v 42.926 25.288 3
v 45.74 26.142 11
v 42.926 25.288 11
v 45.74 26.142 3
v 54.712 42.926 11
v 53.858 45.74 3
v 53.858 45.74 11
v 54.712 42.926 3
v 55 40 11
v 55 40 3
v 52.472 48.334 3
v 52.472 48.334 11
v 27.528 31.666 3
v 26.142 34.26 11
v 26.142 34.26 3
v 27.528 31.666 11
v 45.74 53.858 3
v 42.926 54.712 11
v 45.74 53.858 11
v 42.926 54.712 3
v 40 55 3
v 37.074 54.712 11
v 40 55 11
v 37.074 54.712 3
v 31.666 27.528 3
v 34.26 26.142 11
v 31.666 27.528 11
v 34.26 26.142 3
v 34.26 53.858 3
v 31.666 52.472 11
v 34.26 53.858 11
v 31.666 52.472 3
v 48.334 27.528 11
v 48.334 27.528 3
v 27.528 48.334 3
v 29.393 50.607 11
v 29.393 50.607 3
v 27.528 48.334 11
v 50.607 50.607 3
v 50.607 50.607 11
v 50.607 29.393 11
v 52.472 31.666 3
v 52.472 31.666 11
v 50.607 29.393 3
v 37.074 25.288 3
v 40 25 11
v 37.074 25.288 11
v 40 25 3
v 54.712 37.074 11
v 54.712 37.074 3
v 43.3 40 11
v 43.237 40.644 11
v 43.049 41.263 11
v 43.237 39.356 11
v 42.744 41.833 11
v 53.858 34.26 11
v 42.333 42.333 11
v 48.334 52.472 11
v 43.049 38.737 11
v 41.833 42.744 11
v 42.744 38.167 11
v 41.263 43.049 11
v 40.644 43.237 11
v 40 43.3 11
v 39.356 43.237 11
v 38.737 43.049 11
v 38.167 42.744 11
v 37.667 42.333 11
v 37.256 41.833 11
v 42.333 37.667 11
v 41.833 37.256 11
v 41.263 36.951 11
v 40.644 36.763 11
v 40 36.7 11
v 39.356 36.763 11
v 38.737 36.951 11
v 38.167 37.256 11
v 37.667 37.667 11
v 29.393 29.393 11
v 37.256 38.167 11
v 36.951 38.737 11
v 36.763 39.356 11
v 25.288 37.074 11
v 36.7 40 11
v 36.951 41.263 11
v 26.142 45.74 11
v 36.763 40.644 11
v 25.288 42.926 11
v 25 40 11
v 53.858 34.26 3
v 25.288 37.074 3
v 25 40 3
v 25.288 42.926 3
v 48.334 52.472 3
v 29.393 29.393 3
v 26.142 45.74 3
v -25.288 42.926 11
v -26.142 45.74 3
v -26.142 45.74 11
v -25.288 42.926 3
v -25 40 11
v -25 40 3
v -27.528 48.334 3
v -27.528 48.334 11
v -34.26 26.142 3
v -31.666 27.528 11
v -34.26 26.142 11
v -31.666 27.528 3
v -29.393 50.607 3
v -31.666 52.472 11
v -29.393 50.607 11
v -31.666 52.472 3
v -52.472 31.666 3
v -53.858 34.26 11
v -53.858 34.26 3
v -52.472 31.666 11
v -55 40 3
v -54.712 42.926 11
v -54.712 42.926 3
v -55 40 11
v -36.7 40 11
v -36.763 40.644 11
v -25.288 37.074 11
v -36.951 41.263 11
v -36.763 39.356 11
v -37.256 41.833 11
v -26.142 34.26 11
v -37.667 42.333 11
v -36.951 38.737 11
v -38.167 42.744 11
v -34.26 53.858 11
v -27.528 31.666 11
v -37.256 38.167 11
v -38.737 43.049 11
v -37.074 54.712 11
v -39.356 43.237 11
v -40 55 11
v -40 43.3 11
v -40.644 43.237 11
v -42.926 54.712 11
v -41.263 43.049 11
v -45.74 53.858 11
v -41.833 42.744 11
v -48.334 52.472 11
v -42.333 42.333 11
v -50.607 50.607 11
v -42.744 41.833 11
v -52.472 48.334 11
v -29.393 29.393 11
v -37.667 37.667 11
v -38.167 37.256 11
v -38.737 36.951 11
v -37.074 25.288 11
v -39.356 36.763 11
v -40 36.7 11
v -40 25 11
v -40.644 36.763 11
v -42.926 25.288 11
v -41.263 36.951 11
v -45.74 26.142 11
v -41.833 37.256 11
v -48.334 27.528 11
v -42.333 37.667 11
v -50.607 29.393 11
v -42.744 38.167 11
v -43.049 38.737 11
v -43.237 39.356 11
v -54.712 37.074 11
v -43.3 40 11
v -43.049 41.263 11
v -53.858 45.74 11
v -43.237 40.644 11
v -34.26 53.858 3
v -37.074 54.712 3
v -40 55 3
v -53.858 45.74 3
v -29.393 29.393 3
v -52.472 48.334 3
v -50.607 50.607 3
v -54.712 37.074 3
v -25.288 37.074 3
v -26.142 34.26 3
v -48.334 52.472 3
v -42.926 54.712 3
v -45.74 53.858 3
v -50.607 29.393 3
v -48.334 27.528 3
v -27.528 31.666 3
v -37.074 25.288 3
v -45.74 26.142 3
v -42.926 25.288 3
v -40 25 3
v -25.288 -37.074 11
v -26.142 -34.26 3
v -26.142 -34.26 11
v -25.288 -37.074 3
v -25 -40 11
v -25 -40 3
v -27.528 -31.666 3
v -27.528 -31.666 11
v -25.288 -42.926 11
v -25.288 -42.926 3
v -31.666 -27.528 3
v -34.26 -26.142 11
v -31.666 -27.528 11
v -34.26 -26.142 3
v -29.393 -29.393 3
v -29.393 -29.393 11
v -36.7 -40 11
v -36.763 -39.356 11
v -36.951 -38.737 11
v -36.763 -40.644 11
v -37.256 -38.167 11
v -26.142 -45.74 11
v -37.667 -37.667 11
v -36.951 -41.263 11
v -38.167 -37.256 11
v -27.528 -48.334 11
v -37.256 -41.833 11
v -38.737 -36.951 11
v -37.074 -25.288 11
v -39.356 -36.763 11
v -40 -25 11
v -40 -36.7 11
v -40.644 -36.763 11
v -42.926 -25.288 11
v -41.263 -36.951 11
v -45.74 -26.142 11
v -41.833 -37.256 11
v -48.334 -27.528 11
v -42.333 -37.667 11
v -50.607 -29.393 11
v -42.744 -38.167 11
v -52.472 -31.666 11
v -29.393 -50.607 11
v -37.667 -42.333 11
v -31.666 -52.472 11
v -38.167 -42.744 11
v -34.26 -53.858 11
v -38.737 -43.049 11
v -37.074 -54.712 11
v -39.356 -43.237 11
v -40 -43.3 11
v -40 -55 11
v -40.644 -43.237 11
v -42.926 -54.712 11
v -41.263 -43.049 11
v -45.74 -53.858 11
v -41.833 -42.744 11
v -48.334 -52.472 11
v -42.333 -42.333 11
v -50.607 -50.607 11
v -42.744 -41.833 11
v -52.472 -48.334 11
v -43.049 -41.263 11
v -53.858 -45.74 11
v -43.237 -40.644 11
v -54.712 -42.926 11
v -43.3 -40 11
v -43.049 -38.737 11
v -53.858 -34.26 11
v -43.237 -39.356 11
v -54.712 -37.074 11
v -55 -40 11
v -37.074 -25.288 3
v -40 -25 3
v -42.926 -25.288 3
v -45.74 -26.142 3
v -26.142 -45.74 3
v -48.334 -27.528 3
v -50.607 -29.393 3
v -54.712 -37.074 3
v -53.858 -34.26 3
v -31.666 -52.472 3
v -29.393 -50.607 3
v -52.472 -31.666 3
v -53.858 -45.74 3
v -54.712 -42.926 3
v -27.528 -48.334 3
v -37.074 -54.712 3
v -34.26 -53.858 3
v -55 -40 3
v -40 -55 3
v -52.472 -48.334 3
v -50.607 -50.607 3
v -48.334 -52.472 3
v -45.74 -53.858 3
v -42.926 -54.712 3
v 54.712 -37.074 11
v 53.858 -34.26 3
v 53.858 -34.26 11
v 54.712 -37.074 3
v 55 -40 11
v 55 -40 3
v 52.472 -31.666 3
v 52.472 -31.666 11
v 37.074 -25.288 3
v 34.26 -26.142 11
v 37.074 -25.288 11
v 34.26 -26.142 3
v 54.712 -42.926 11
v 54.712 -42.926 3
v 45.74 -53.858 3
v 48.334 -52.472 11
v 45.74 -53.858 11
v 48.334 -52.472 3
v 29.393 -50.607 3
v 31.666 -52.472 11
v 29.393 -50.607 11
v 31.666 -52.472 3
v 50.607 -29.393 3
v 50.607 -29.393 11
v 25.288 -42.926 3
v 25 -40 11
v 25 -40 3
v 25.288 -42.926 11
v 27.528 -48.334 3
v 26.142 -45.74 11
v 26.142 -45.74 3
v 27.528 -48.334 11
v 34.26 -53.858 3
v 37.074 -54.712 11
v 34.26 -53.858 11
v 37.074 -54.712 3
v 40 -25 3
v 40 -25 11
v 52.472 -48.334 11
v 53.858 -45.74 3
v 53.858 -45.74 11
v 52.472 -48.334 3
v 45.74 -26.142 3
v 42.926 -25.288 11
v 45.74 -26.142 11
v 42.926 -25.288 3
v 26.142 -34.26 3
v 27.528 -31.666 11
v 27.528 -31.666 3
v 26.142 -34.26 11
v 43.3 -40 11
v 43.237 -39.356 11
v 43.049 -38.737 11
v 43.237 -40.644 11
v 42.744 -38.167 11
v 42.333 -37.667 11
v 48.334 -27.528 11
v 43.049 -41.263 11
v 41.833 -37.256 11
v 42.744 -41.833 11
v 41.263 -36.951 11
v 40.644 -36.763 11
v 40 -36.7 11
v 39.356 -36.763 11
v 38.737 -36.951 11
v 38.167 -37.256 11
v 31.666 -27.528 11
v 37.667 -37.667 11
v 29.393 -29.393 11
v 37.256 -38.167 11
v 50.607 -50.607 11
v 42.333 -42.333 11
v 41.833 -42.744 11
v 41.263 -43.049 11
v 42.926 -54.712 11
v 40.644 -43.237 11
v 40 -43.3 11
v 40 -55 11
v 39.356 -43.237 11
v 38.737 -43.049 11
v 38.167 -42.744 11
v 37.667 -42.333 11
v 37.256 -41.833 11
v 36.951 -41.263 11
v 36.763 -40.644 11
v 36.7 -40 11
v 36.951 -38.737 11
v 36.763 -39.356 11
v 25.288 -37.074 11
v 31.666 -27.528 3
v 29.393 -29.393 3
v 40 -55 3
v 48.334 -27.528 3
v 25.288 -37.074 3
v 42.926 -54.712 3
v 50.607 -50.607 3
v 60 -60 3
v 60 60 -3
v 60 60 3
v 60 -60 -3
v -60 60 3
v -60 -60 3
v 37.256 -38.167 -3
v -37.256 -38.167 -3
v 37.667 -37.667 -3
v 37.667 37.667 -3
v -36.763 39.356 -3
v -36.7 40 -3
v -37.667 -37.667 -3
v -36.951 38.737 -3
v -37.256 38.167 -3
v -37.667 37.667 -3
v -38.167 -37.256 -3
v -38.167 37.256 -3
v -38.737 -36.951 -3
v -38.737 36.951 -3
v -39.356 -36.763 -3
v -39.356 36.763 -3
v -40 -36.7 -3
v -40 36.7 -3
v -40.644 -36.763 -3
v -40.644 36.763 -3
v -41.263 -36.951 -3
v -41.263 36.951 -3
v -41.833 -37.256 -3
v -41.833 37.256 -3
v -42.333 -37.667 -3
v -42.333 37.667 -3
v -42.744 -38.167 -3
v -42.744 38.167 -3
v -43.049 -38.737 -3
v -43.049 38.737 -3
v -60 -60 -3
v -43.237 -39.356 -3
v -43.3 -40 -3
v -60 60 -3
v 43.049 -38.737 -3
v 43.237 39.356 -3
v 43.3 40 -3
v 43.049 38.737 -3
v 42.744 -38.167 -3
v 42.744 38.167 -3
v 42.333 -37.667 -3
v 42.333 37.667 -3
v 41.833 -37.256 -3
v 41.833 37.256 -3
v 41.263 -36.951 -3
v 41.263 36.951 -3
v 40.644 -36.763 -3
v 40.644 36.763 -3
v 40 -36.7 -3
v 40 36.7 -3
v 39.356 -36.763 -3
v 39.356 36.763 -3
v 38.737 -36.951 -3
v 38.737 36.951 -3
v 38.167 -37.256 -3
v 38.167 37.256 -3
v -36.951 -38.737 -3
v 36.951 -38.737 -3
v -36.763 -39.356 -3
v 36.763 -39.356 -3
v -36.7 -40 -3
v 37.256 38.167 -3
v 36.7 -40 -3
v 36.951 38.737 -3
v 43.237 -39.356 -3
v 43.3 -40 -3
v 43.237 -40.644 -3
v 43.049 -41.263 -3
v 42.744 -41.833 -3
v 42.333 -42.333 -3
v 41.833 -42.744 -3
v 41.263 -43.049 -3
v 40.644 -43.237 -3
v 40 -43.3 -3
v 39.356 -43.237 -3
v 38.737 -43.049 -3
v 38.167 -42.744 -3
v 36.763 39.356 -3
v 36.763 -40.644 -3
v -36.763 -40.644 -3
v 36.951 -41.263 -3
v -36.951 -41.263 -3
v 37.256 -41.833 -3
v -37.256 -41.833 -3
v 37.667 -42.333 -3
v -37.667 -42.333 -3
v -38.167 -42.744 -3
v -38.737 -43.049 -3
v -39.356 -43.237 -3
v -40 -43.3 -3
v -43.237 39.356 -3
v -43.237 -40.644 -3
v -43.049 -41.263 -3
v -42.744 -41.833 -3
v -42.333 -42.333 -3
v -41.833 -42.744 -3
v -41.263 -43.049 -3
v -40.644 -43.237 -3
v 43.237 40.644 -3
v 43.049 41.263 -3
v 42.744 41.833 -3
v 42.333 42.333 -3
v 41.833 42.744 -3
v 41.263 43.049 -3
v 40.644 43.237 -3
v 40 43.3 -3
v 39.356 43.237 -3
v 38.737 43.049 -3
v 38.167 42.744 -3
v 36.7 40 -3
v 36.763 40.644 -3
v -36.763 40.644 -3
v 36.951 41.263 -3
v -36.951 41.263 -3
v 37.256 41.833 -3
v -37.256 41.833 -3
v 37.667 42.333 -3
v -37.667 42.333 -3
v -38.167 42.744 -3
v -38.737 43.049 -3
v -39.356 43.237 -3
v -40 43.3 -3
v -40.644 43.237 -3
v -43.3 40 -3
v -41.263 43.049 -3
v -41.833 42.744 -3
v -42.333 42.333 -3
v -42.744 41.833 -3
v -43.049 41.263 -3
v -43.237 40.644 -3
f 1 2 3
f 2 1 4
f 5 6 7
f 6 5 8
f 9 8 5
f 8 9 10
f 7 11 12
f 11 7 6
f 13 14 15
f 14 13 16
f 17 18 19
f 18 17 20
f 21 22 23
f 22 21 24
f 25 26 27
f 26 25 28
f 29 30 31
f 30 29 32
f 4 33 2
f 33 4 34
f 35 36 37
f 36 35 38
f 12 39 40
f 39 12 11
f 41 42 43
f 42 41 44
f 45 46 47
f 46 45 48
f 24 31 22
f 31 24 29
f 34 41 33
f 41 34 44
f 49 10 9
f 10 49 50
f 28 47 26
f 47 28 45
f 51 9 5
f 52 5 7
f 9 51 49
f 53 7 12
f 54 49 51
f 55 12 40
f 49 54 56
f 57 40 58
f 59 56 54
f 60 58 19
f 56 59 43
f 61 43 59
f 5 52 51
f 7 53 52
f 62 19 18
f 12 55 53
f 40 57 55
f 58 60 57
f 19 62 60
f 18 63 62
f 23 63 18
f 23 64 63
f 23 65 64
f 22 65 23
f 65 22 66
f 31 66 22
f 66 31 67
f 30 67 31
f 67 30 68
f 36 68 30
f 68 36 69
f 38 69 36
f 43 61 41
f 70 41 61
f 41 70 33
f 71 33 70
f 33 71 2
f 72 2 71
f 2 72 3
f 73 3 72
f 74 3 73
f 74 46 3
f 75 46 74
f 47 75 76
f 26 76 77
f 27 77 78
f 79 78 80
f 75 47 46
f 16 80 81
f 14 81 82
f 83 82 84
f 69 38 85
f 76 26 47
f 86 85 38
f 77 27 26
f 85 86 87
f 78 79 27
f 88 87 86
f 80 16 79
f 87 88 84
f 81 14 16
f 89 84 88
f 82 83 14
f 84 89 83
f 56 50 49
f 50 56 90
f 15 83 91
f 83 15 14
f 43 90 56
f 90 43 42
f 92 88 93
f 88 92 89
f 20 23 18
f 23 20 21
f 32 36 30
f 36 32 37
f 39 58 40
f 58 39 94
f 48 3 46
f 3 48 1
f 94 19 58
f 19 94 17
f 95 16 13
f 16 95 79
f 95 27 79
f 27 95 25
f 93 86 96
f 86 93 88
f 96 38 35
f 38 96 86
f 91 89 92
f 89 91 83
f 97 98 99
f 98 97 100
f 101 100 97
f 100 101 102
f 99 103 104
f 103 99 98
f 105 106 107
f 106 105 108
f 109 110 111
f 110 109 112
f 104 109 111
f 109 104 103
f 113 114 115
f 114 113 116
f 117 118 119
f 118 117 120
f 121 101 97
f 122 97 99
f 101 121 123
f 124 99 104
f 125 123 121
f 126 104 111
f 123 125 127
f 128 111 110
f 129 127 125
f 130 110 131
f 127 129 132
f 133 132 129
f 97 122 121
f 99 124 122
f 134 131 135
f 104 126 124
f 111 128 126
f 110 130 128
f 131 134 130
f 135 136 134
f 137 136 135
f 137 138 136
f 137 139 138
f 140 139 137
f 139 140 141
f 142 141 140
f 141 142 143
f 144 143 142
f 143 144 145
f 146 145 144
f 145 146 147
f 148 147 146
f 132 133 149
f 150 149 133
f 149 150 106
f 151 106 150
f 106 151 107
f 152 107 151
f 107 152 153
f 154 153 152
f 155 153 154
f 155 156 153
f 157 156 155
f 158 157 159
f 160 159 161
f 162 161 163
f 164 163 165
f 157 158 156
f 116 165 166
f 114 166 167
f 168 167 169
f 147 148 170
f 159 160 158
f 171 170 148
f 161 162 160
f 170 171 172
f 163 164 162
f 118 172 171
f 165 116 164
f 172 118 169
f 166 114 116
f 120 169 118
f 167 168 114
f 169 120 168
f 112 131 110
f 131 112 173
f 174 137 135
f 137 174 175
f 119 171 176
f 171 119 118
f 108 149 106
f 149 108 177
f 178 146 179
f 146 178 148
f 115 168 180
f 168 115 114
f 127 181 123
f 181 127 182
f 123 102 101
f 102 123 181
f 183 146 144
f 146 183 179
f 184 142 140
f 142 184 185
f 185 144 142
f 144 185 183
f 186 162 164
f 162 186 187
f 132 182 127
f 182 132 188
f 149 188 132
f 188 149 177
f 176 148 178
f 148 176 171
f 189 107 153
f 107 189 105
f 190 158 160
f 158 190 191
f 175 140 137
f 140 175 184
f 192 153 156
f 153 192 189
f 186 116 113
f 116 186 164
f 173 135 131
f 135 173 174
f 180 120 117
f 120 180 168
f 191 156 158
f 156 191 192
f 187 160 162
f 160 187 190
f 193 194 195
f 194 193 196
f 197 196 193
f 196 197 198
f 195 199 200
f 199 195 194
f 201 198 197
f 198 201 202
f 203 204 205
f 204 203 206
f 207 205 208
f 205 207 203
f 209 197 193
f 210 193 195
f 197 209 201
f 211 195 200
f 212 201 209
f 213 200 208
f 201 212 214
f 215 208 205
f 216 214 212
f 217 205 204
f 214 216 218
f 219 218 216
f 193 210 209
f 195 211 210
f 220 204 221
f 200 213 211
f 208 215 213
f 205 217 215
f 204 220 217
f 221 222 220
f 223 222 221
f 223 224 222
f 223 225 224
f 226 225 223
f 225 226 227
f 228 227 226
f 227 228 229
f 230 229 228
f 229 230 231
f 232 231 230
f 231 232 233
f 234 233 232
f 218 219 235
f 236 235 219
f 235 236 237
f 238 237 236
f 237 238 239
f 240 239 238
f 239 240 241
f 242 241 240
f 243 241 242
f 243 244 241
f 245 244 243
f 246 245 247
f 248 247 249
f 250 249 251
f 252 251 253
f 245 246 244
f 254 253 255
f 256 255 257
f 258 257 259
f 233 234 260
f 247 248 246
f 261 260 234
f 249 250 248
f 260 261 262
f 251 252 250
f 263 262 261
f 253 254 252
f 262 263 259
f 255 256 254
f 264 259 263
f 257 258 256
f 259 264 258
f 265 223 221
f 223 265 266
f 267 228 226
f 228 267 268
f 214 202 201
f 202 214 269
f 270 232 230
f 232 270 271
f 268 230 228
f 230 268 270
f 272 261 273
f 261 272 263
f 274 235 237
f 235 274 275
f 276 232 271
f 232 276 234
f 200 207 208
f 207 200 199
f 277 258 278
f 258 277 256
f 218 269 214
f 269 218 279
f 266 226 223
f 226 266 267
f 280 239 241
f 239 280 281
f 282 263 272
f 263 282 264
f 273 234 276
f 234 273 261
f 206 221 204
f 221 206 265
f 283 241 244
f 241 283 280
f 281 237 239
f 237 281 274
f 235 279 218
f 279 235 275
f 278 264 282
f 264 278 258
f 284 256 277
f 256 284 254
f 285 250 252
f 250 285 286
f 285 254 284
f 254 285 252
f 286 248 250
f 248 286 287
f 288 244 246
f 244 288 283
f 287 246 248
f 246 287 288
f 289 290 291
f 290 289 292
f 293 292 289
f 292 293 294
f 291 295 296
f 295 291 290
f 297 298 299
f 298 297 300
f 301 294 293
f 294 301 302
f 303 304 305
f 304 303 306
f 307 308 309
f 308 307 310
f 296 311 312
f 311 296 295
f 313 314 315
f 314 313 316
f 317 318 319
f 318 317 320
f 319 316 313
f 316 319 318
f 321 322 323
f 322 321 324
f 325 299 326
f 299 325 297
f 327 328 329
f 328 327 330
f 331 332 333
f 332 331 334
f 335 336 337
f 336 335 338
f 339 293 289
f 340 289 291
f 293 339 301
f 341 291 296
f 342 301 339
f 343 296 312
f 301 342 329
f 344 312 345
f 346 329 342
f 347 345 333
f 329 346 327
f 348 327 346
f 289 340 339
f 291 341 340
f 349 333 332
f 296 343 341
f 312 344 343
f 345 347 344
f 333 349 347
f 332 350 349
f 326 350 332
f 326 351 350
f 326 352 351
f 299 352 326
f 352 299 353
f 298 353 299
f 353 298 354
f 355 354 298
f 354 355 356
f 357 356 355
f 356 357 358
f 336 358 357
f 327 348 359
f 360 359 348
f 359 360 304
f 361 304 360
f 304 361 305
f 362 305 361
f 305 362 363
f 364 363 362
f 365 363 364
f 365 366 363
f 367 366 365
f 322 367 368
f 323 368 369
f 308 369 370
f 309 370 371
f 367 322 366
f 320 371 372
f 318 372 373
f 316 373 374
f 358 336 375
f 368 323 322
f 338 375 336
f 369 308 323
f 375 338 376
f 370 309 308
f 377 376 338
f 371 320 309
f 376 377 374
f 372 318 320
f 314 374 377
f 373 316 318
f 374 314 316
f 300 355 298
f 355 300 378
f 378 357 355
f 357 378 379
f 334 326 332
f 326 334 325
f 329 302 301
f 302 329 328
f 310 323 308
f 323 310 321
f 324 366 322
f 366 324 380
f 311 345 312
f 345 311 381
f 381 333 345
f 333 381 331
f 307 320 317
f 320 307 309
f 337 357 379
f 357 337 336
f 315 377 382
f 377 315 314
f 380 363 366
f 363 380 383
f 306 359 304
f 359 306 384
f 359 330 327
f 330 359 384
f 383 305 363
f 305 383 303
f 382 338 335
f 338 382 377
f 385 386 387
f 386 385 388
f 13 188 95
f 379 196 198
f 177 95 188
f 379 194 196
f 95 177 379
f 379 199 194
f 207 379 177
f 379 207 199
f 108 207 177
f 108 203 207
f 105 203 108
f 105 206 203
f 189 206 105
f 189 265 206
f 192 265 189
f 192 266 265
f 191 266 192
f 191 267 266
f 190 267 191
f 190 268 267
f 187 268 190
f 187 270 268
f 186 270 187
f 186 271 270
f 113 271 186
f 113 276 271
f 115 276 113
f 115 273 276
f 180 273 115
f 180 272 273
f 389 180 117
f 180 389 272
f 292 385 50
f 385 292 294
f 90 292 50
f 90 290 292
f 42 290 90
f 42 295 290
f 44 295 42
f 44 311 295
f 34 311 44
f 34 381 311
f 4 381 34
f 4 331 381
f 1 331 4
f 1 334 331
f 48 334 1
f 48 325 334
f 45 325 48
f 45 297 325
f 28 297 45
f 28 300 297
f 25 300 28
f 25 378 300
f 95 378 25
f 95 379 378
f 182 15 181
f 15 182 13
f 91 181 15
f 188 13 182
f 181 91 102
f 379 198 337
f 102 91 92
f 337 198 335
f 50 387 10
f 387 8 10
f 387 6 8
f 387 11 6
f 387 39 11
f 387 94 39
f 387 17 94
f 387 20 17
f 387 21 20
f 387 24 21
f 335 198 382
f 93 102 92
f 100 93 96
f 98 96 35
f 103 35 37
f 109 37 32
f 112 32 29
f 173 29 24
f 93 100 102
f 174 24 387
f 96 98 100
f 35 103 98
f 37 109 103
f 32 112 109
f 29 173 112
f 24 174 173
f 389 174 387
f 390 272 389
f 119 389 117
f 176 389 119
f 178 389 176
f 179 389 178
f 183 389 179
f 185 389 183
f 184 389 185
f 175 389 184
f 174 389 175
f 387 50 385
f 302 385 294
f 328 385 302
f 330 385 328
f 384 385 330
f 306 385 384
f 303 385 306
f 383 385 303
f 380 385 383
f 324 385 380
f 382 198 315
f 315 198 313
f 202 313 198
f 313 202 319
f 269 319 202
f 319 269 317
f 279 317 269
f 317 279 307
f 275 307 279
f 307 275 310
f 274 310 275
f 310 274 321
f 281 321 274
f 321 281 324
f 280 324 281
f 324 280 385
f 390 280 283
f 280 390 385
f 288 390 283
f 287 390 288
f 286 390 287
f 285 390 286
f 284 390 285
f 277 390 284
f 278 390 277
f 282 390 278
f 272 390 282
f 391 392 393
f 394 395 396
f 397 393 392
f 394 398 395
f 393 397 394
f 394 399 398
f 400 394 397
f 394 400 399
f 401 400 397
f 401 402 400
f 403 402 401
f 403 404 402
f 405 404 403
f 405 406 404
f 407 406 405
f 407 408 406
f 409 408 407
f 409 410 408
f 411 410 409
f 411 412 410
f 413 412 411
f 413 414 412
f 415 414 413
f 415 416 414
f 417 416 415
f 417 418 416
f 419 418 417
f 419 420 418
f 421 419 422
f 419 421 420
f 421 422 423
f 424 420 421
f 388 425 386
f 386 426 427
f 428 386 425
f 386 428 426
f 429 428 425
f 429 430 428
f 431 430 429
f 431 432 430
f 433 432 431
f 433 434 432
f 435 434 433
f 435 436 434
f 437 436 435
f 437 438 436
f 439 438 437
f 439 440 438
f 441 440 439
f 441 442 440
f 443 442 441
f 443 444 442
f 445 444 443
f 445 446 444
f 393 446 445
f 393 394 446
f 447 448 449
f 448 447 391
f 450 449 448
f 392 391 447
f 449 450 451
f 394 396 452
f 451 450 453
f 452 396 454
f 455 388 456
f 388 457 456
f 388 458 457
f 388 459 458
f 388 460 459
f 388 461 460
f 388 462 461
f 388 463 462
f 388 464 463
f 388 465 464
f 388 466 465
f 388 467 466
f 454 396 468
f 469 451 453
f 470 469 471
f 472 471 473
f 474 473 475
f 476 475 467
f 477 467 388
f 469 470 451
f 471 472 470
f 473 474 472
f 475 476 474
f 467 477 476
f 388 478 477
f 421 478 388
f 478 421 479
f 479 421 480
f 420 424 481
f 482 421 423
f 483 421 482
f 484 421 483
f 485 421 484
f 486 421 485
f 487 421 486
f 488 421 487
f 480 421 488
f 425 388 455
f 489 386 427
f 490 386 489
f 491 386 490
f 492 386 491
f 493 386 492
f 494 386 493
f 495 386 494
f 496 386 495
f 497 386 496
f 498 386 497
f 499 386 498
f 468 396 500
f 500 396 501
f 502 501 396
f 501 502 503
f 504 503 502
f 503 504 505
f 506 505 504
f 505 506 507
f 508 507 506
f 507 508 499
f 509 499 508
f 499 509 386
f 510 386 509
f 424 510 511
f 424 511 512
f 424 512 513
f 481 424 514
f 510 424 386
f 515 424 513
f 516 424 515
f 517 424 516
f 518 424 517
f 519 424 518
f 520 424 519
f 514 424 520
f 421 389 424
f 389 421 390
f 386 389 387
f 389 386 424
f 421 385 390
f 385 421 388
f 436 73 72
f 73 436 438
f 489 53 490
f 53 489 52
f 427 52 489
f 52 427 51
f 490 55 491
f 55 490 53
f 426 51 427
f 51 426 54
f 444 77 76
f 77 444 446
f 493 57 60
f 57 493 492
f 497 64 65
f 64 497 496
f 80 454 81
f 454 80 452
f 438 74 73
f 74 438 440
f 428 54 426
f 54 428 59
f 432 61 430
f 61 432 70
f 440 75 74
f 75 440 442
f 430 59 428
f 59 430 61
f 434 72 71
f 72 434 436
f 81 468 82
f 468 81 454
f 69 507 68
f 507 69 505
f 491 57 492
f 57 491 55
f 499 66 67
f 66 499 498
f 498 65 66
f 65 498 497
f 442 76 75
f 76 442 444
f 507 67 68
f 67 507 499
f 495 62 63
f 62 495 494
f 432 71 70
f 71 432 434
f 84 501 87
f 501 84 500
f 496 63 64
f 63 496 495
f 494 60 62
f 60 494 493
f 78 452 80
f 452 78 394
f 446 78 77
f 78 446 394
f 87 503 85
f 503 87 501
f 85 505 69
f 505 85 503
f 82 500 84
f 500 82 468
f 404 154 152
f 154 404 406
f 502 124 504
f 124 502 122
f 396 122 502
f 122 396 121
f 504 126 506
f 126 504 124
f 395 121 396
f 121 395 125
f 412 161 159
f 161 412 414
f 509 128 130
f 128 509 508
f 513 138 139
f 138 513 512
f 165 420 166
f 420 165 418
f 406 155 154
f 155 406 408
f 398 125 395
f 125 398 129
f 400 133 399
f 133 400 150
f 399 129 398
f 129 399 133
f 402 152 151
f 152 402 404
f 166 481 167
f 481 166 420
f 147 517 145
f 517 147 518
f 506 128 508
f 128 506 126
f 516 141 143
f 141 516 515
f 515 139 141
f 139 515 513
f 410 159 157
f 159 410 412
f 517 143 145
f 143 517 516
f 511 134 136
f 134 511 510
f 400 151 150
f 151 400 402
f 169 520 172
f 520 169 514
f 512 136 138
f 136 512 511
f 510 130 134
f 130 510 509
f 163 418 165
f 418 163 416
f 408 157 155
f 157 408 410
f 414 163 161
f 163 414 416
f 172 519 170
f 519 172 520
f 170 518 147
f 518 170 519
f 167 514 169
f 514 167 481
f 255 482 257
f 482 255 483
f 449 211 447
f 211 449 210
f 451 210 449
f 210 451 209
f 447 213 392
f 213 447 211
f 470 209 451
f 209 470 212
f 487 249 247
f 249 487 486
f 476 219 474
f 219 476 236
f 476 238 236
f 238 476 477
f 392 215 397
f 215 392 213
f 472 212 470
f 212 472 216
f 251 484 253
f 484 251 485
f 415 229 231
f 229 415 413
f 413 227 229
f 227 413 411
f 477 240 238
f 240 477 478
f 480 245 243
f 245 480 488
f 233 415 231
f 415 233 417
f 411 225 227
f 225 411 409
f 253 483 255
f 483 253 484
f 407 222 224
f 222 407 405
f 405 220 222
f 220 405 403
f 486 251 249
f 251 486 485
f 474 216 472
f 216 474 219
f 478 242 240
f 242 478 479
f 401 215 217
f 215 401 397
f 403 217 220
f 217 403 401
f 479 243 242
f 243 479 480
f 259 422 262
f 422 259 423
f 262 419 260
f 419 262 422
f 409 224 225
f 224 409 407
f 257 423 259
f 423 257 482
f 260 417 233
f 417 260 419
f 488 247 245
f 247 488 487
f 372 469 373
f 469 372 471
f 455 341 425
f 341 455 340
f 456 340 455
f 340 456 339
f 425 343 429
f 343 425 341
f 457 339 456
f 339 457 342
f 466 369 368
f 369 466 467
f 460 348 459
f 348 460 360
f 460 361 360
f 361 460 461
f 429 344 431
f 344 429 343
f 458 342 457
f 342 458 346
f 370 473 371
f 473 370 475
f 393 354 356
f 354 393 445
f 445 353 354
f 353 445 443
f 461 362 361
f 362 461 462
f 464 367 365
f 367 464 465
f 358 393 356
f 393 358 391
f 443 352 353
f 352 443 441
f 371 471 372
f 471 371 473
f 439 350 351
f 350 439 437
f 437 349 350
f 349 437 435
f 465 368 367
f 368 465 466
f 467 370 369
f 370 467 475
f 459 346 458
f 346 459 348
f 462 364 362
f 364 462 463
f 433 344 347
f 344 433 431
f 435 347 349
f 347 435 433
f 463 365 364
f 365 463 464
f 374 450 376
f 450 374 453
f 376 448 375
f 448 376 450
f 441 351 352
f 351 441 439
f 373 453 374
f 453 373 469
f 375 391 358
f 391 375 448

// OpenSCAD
$fn = 32;

// ----------------------------------------------------------------------
// Anchor pads 120 x 120 x 14
// four corner bosses with anchor holes
// ----------------------------------------------------------------------

// --- parameters (mm) ---
plate = [120, 120, 6];  // base plate size (x, y, z)
pads = 4;               // boss count, one per corner
edge = 20;              // boss centre offset from the plate edge
boss_d = 30;            // boss diameter
boss_h = 8;             // boss height above the base plate
hole_d = 6.6;           // hole diameter

// --- derived feature positions (mm) ---
height = plate[2] + boss_h;      // = 14   overall height of the part
corner_x = plate[0] / 2 - edge;  // = 40   boss centre X
corner_y = plate[1] / 2 - edge;  // = 40   boss centre Y
feature_centers = [
  [corner_x, corner_y],
  [-corner_x, corner_y],
  [-corner_x, -corner_y],
  [corner_x, -corner_y]
];   // boss centres, anchor holes are drilled there

// base plate, four bosses standing on it, anchor holes all the way through
difference() {
  union() {
    cube(plate, center = true);
    for (centre = feature_centers)
      translate([centre[0], centre[1], plate[2] / 2 - 1])
        cylinder(d = boss_d, h = boss_h + 1);
  }
  for (centre = feature_centers)
    translate([centre[0], centre[1], -height])
      cylinder(d = hole_d, h = 2 * height + 2);  // through boss and plate
}
